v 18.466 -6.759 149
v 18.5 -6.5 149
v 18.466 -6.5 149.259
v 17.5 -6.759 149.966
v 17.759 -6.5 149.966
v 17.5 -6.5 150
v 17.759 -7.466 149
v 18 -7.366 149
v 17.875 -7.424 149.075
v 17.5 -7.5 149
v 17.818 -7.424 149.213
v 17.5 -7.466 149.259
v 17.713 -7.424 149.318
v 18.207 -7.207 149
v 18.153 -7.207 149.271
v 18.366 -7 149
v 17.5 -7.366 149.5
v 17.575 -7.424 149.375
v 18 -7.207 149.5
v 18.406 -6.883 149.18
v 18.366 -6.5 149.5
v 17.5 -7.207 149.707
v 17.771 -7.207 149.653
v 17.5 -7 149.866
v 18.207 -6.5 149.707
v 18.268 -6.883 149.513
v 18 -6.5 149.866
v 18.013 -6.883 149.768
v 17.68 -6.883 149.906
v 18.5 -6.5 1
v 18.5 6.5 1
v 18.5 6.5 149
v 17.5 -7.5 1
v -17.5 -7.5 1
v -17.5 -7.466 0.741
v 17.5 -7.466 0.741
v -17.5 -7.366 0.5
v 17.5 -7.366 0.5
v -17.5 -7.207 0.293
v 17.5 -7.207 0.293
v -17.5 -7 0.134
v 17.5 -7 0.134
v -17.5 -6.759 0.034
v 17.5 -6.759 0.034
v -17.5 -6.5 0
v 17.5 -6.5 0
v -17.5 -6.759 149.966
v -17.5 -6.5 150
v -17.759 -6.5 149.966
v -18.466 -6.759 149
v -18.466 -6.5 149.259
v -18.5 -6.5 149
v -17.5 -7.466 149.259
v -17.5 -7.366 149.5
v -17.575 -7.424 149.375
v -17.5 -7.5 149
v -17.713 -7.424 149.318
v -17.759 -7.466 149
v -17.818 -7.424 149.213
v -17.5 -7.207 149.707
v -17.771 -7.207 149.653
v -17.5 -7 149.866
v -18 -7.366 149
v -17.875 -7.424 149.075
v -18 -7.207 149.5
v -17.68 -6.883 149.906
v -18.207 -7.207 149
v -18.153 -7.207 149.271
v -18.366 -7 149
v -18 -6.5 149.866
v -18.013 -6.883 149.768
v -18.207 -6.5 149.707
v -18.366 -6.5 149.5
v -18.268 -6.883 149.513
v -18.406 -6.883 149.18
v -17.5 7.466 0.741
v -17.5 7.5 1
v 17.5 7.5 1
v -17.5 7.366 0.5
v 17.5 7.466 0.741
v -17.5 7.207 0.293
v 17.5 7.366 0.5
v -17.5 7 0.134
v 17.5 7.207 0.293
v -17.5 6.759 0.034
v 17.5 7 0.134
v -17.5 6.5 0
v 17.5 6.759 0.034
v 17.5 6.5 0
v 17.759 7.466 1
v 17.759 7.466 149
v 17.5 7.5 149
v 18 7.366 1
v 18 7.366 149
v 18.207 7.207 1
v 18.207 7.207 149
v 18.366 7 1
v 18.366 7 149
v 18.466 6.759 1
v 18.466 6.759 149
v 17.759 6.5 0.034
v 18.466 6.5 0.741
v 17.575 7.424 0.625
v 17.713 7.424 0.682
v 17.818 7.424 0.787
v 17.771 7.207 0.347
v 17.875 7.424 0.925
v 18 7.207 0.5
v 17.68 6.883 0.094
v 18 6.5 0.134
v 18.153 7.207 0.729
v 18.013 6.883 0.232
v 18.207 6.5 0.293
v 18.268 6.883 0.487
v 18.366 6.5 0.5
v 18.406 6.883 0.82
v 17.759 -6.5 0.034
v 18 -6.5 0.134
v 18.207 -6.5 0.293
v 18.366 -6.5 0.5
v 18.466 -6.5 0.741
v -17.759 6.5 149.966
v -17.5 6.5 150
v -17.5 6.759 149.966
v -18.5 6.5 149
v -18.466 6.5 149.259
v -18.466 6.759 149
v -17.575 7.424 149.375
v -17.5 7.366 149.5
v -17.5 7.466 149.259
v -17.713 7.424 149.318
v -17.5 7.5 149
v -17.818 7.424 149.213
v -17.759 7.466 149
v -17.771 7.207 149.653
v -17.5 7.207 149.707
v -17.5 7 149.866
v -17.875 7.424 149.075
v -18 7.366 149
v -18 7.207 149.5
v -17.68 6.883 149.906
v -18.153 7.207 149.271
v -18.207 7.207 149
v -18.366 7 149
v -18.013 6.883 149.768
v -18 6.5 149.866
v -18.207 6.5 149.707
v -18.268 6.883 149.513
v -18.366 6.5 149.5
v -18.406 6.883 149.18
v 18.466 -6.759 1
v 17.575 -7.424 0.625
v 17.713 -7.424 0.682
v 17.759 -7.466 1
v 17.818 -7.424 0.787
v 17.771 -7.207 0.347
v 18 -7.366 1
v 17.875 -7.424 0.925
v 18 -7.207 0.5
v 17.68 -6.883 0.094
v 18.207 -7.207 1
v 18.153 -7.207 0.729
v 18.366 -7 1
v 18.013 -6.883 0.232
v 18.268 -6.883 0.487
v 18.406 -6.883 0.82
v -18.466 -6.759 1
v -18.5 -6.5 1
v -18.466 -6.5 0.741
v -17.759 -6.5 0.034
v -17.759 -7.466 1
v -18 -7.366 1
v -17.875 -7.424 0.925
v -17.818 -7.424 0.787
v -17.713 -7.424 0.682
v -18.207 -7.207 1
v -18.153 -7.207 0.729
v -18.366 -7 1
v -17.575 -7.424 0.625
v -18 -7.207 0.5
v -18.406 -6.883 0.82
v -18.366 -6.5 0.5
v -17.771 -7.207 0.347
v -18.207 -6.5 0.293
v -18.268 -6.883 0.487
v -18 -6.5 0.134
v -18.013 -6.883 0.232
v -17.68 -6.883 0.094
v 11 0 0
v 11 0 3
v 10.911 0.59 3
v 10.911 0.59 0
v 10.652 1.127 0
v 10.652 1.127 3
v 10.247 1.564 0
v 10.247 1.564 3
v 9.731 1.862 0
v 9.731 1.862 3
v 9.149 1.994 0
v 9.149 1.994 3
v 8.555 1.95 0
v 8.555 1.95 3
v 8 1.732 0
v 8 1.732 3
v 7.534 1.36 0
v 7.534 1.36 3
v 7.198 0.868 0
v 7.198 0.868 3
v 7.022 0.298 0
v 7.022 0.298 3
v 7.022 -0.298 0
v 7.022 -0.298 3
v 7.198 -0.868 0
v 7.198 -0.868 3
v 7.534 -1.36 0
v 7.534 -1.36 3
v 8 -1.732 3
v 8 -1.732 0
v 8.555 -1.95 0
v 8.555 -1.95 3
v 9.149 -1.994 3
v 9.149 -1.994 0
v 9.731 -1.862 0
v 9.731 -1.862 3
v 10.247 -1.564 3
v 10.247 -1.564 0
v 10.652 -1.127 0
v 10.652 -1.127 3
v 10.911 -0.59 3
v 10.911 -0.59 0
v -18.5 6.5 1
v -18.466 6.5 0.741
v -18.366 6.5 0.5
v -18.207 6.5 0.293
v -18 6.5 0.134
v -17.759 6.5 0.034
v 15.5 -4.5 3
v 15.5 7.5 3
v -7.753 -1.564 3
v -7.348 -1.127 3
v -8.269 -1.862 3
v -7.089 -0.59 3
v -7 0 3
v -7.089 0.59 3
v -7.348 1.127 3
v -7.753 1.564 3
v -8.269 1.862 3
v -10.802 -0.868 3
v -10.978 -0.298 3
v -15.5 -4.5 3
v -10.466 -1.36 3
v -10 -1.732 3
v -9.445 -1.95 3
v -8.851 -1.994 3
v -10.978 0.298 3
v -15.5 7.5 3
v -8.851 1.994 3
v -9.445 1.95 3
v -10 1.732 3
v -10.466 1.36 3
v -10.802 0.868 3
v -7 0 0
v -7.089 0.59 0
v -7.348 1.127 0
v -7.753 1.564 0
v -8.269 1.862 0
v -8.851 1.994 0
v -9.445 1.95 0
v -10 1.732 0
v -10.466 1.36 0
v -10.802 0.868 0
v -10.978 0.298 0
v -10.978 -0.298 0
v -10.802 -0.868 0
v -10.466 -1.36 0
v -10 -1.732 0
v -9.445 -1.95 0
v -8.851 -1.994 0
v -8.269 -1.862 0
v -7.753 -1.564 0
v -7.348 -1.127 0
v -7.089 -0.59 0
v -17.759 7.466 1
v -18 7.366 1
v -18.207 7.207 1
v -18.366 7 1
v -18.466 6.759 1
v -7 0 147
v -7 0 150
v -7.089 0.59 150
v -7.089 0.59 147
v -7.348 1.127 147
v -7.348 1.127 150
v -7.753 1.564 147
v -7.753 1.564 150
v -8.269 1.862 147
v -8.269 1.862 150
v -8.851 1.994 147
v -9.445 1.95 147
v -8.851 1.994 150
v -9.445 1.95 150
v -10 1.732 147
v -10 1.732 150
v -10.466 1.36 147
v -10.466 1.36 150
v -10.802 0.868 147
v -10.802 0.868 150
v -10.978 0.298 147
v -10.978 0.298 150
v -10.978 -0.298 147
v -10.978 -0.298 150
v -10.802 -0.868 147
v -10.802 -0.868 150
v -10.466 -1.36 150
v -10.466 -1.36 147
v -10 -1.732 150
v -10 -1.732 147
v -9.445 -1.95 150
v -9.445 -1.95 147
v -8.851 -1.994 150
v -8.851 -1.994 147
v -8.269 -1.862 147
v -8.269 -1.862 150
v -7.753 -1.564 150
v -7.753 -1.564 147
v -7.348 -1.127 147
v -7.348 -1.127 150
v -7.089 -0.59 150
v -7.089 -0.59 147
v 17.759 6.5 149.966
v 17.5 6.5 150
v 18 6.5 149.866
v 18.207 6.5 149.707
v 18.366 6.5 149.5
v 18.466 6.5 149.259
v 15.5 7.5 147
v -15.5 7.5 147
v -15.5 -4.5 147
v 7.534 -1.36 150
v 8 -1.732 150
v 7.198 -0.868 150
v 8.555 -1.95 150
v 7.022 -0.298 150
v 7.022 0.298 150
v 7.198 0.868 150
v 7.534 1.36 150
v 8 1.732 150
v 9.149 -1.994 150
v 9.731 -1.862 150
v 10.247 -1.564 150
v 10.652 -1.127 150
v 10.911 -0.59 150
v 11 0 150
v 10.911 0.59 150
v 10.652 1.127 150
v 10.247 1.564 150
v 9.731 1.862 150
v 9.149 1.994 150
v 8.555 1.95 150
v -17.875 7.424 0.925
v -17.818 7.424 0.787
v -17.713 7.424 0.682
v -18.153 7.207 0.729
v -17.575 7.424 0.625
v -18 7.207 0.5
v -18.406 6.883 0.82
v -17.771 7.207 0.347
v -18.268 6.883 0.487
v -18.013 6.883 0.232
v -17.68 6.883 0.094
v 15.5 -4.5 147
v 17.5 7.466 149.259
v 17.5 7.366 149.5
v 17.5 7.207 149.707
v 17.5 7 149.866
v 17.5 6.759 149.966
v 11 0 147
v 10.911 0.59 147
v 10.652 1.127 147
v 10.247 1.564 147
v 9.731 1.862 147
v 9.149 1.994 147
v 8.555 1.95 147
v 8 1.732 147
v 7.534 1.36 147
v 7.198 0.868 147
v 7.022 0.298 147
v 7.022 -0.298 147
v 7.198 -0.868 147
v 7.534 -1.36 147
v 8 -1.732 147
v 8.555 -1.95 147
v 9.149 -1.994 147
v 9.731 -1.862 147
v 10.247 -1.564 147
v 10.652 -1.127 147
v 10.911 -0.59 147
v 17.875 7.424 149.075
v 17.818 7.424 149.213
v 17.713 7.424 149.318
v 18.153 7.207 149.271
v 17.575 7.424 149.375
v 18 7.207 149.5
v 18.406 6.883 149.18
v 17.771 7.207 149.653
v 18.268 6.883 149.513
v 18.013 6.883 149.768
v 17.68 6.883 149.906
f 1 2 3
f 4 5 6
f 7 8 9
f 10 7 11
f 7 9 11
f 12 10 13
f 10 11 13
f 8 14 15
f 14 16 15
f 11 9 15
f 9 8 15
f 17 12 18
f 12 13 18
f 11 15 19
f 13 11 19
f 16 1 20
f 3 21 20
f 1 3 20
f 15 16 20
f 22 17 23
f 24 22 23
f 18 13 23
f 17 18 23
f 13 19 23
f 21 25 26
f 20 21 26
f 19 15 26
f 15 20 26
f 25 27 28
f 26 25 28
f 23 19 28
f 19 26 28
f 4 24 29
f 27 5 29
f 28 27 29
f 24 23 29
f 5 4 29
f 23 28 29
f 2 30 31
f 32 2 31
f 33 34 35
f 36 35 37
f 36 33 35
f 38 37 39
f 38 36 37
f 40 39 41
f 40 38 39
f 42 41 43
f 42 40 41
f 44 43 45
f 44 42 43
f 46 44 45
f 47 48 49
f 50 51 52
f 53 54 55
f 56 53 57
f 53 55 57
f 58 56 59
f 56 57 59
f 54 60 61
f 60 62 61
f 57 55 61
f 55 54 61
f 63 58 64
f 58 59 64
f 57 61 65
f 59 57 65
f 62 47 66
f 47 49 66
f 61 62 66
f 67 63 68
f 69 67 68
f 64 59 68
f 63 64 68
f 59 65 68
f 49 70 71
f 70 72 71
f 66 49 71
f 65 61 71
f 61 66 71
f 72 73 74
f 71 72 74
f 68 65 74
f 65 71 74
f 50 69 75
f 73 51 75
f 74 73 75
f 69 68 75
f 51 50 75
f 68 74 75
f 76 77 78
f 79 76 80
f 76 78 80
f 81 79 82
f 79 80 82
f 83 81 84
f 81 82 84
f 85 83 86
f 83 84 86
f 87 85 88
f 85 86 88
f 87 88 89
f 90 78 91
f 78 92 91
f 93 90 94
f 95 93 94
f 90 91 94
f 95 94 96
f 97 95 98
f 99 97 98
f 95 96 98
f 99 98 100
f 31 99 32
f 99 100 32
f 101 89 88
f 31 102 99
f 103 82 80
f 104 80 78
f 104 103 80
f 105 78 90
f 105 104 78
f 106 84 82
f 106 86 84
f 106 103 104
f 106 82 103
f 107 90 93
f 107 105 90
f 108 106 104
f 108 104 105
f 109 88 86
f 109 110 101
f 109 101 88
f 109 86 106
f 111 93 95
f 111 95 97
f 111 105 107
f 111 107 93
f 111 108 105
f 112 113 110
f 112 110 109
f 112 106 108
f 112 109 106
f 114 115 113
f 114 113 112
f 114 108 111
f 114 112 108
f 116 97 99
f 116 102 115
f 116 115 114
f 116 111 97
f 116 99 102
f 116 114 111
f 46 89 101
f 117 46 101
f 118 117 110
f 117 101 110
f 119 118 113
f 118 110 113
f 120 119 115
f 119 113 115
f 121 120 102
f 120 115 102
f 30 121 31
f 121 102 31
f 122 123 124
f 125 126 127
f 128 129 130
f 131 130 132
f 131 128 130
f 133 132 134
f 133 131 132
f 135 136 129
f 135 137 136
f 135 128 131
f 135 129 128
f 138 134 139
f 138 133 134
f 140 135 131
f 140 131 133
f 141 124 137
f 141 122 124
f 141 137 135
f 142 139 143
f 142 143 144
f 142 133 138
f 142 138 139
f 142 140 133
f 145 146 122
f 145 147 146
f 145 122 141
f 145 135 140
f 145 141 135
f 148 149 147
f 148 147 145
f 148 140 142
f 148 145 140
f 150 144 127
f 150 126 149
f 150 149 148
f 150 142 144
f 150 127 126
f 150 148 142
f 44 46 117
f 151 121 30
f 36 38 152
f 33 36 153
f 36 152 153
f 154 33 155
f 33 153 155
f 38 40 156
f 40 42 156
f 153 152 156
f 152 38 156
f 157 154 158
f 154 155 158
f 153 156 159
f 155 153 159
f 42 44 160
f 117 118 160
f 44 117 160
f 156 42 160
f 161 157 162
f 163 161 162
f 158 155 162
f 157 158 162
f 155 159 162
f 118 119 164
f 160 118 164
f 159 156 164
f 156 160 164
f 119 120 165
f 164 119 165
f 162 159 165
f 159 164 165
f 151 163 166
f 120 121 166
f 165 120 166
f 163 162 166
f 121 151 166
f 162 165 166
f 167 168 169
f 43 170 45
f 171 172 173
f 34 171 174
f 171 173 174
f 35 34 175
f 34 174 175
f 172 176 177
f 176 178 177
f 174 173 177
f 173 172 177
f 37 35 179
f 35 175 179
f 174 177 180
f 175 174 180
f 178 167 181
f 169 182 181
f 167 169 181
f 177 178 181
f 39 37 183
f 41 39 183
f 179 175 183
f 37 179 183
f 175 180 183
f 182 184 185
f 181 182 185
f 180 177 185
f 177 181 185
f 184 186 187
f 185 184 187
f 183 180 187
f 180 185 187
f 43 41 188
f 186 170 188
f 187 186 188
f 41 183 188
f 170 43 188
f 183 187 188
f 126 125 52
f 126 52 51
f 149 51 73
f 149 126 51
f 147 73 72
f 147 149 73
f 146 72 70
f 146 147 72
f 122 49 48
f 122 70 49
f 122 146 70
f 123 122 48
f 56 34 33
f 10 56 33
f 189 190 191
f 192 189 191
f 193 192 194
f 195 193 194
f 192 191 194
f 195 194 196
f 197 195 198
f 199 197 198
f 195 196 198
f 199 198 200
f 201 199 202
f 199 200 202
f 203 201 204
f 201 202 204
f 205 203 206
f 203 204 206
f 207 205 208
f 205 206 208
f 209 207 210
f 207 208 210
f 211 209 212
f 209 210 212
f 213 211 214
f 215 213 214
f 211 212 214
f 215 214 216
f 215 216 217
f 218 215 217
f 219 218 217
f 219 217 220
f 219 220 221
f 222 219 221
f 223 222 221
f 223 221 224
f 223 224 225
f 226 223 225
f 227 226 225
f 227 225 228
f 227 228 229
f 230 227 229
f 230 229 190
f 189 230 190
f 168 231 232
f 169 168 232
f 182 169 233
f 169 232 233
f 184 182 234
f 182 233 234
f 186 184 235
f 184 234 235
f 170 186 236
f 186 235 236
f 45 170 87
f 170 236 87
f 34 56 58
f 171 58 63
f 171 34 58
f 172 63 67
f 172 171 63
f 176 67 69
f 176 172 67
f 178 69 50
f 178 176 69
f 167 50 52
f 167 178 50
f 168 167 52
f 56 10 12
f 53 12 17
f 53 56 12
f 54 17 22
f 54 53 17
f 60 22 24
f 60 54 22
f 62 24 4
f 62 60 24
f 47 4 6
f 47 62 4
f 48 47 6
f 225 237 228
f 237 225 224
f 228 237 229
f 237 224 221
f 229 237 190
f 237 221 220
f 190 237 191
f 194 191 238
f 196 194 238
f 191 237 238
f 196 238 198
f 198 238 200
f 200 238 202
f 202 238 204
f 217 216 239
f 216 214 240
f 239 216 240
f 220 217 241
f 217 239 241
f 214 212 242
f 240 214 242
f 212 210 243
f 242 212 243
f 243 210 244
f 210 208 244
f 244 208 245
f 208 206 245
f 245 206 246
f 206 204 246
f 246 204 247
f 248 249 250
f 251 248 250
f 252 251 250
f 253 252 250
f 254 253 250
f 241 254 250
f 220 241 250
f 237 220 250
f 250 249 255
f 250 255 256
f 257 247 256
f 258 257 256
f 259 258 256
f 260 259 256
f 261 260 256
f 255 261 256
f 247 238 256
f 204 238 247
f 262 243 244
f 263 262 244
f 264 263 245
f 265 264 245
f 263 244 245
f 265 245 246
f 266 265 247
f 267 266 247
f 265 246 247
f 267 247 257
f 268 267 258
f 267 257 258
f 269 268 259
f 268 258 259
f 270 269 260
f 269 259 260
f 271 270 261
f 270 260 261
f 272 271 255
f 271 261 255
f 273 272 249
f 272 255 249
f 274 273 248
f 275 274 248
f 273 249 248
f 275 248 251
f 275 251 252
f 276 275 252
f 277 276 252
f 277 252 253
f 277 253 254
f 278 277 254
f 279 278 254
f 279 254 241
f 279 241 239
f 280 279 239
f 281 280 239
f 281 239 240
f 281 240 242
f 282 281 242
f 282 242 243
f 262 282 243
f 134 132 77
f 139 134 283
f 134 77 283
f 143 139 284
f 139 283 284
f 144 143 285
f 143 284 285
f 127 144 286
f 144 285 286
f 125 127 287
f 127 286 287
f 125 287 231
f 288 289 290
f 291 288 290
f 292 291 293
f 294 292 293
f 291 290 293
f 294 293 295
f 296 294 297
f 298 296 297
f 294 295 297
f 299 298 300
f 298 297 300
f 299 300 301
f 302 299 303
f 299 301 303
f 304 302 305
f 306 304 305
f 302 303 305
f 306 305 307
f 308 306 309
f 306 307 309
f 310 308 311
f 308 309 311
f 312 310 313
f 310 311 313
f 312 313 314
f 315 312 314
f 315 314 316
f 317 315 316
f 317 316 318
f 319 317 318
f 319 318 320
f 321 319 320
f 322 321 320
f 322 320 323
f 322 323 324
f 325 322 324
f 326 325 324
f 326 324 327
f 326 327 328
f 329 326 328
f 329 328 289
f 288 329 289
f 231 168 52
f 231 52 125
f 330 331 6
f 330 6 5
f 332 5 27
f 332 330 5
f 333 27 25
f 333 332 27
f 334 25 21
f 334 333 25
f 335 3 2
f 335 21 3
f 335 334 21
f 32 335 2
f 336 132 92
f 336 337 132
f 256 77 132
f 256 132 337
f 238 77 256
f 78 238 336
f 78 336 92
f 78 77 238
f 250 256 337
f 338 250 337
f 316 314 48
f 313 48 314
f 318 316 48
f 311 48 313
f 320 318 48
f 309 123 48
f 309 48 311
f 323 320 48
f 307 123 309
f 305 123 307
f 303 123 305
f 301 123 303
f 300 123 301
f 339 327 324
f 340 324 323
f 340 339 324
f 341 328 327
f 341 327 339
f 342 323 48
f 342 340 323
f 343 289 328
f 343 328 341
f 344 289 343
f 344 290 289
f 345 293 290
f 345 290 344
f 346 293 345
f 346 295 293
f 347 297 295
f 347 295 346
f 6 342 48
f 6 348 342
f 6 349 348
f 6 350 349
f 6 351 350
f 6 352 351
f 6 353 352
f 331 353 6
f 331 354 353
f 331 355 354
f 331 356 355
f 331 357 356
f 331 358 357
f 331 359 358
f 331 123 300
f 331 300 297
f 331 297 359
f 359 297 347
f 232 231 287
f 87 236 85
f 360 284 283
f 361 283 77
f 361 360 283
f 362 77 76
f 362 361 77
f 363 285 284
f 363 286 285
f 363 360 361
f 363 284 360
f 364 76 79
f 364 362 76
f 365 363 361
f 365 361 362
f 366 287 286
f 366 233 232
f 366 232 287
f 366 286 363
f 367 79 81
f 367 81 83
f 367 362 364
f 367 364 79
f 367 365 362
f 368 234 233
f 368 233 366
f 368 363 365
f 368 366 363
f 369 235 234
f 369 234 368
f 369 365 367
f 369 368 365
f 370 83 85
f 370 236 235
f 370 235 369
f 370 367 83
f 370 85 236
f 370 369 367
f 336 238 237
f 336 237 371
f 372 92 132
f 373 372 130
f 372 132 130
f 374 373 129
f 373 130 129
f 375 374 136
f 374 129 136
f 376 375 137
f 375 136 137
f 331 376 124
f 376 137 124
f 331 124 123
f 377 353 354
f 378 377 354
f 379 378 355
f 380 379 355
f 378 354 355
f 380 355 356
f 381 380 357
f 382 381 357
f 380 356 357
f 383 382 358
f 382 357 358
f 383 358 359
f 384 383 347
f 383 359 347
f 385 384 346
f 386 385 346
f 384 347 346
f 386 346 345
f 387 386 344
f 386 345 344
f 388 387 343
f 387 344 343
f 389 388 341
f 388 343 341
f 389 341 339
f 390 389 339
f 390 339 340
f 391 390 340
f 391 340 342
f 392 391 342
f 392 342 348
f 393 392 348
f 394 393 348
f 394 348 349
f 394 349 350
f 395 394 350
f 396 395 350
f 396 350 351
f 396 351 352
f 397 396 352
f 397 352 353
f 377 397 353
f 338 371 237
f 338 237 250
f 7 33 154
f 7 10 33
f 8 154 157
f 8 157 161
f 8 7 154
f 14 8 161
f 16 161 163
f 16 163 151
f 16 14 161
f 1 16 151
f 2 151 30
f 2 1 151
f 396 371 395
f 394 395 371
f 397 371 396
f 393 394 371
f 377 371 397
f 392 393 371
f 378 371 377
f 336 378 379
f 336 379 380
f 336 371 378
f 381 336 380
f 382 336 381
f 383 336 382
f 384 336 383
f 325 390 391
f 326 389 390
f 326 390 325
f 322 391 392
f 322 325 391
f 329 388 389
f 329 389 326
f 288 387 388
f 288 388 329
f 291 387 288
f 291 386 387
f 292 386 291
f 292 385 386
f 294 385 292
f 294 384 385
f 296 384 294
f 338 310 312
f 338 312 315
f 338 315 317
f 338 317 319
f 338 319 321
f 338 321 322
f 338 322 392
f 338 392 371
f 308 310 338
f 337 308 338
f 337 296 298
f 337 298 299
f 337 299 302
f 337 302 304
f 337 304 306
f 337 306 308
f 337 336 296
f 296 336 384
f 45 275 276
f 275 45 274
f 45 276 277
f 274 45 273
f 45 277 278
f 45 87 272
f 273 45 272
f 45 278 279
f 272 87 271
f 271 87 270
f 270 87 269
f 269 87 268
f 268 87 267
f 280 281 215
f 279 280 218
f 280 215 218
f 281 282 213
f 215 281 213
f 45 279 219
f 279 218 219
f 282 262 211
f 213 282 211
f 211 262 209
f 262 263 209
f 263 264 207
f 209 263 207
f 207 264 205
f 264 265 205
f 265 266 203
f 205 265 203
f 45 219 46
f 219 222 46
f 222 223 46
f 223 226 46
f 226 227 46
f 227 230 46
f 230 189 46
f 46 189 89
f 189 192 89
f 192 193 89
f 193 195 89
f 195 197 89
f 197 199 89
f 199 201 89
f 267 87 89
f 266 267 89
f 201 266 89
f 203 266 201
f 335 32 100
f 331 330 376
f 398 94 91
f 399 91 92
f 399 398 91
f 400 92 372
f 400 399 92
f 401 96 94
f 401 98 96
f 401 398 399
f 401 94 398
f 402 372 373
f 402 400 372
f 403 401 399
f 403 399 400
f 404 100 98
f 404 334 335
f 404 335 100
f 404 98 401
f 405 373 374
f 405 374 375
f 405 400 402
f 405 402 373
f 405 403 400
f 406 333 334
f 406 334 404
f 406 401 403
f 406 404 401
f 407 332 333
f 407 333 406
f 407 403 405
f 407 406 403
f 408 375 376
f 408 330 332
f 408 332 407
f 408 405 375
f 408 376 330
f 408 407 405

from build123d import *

# Parameters (mm, degrees)
F0_W     = 37
F0_H     = 15
F1_DEPTH = 150
F2_W     = 31
F2_H     = 144
F3_DEPTH = 12
F4_R     = 2
F5_DEPTH = 150.001
F6_R     = 1
F7_R     = 1


with BuildPart() as f1:
    # F0 (on Top) → F1 (new body)
    with BuildSketch(Plane.XY):
        Rectangle(F0_W, F0_H)
    extrude(amount=F1_DEPTH)

    # F2 (on face) → F3 (cut)
    with BuildSketch(Plane(origin=(0, 7.5, 0), x_dir=(-1, 0, 0), z_dir=(0, 1, 0))):
        with Locations((0, 75)):
            Rectangle(F2_W, F2_H)
    extrude(amount=-F3_DEPTH, mode=Mode.SUBTRACT)

    # F4 (on face) → F5 (cut, through all)
    with BuildSketch(Plane.XY.offset(150)):
        with Locations((9, 0)):
            Circle(F4_R)
        with Locations((-9, 0)):
            Circle(F4_R)
    extrude(amount=-F5_DEPTH, mode=Mode.SUBTRACT)

    # F6
    f6_edges = [f1.edges().sort_by_distance(p)[0] for p in [
        (-18.5, 0, 150),
        (18.5, 0, 150),
        (-18.5, 0, 0),
        (18.5, 0, 0),
    ]]
    fillet(f6_edges, radius=F6_R)

    # F7
    f7_edges = [f1.edges().sort_by_distance(p)[0] for p in [
        (18.5, -7.5, 75),
        (18.5, 7.5, 75),
    ]]
    fillet(f7_edges, radius=F7_R)


solid = f1.part
